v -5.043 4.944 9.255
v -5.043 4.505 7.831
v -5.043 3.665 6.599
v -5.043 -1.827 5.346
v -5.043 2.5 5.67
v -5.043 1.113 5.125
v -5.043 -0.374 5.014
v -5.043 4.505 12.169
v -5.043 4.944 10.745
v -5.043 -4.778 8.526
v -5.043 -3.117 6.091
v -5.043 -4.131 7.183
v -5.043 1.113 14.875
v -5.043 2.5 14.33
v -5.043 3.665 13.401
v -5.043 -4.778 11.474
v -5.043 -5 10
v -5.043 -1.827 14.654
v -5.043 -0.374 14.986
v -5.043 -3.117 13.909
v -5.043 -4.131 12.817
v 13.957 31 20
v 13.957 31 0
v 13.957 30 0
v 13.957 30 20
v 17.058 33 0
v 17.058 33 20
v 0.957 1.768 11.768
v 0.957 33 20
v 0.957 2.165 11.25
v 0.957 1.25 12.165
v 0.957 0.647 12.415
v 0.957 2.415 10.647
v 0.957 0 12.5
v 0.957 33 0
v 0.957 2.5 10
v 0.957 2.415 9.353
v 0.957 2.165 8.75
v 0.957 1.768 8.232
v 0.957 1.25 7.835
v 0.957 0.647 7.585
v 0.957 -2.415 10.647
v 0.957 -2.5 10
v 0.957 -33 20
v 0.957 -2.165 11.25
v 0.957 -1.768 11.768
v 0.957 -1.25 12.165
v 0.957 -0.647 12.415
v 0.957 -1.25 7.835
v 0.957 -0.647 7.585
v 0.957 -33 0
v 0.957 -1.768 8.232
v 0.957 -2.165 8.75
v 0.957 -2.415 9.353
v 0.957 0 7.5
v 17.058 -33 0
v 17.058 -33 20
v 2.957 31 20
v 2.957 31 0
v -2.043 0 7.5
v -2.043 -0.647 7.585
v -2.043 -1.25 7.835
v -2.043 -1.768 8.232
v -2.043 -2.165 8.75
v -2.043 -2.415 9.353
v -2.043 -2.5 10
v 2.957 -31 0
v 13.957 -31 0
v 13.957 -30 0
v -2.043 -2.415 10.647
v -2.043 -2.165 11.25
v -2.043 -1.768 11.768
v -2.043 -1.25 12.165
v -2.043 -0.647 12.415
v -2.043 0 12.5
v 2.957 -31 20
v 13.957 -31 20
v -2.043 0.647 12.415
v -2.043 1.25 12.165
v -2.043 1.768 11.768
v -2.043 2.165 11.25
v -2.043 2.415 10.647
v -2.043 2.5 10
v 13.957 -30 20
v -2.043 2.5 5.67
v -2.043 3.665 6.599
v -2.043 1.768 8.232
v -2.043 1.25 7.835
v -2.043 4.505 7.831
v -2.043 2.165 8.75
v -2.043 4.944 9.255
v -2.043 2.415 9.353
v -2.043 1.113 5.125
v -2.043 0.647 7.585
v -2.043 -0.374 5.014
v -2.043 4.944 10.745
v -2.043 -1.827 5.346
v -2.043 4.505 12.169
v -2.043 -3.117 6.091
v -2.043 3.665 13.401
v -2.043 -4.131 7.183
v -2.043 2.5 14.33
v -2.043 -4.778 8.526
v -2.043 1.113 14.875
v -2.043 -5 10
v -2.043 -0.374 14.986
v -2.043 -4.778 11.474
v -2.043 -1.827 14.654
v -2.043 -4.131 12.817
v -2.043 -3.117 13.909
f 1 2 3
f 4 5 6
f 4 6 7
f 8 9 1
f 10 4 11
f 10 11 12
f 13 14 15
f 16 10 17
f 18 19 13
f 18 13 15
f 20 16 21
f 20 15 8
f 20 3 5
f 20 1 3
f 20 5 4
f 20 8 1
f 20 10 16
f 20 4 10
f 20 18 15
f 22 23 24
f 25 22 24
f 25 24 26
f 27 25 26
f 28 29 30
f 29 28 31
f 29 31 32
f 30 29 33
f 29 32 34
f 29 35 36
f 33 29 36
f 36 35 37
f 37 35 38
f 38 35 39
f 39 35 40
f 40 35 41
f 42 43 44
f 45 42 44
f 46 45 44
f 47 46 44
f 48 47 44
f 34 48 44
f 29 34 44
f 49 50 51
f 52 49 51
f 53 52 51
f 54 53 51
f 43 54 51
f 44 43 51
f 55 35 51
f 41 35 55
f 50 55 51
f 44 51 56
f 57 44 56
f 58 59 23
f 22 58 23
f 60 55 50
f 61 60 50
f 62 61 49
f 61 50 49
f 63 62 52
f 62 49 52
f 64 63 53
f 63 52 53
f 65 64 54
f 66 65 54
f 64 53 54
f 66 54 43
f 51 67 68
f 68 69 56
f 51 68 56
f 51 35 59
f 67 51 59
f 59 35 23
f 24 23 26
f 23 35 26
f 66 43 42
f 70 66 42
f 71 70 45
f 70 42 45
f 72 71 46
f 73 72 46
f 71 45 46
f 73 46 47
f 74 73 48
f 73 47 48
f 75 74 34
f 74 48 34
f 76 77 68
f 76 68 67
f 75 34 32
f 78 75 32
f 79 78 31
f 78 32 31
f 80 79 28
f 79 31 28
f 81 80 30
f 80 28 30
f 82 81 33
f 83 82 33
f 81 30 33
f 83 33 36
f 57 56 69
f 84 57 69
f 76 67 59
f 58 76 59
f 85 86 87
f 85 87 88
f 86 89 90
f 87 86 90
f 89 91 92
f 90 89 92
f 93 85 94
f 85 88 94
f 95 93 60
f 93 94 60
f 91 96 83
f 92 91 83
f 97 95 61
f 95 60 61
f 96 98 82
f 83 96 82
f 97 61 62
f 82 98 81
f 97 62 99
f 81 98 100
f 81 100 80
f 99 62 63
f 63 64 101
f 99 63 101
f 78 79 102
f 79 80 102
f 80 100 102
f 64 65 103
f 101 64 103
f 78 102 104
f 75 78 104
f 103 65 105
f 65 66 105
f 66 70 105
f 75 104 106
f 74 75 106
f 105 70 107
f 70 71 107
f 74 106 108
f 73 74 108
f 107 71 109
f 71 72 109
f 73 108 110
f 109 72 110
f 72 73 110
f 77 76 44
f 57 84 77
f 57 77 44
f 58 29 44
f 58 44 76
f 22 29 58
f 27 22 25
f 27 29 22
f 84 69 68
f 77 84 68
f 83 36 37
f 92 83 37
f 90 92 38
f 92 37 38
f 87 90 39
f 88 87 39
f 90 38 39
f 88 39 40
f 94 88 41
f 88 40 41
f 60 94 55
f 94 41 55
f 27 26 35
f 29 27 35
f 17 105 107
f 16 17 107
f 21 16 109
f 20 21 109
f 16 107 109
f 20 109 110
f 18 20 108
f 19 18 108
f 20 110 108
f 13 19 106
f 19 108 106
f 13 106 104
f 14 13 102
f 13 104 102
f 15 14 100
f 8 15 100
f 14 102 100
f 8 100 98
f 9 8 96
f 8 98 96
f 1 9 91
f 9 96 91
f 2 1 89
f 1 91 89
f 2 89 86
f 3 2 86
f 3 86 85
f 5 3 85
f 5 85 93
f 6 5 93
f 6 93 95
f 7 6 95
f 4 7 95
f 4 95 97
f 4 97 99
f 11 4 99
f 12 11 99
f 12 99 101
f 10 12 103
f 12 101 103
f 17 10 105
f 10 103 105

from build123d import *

# Parameters (mm, degrees)
F1_DEPTH = 20
F3_DEPTH = 3
F4_R     = 5
F5_DEPTH = 3


with BuildPart() as f1:
    # F0 (on Top) → F1 (new body)
    with BuildSketch(Plane.XY):
        Polygon((0.95669, 33), (0.95669, 0), (0.95669, -33), (17.058177, -33), (13.95669, -30), (13.95669, -31), (2.95669, -31), (2.95669, 0), (2.95669, 31), (13.95669, 31), (13.95669, 30), (17.058177, 33), align=None)
    extrude(amount=F1_DEPTH)

    # F2 (on face) → F3 (join)
    with BuildSketch(Plane(origin=(0.95669, 0, 0), x_dir=(0, -1, 0), z_dir=(-1, 0, 0))):
        with BuildLine():
            ThreePointArc((2.5, 10), (1.767767, 11.767767), (0, 12.5))
            Line((0, 12.5), (0, 10))
            Line((0, 10), (2.5, 10))
        make_face()
        with BuildLine():
            Line((0, 10), (0, 12.5))
            ThreePointArc((0, 12.5), (-1.767767, 11.767767), (-2.5, 10))
            Line((-2.5, 10), (0, 10))
        make_face()
        with BuildLine():
            Line((2.5, 10), (0, 10))
            Line((0, 10), (0, 7.5))
            ThreePointArc((0, 7.5), (1.767767, 8.232233), (2.5, 10))
        make_face()
        with BuildLine():
            Line((0, 7.5), (0, 10))
            Line((0, 10), (-2.5, 10))
            ThreePointArc((-2.5, 10), (-1.767767, 8.232233), (0, 7.5))
        make_face()
    extrude(amount=F3_DEPTH)

    # F4 (on face) → F5 (join)
    with BuildSketch(Plane(origin=(-2.04331, 0, 0), x_dir=(0, -1, 0), z_dir=(-1, 0, 0))):
        with Locations((0, 10)):
            Circle(F4_R)
    extrude(amount=F5_DEPTH)


solid = f1.part
